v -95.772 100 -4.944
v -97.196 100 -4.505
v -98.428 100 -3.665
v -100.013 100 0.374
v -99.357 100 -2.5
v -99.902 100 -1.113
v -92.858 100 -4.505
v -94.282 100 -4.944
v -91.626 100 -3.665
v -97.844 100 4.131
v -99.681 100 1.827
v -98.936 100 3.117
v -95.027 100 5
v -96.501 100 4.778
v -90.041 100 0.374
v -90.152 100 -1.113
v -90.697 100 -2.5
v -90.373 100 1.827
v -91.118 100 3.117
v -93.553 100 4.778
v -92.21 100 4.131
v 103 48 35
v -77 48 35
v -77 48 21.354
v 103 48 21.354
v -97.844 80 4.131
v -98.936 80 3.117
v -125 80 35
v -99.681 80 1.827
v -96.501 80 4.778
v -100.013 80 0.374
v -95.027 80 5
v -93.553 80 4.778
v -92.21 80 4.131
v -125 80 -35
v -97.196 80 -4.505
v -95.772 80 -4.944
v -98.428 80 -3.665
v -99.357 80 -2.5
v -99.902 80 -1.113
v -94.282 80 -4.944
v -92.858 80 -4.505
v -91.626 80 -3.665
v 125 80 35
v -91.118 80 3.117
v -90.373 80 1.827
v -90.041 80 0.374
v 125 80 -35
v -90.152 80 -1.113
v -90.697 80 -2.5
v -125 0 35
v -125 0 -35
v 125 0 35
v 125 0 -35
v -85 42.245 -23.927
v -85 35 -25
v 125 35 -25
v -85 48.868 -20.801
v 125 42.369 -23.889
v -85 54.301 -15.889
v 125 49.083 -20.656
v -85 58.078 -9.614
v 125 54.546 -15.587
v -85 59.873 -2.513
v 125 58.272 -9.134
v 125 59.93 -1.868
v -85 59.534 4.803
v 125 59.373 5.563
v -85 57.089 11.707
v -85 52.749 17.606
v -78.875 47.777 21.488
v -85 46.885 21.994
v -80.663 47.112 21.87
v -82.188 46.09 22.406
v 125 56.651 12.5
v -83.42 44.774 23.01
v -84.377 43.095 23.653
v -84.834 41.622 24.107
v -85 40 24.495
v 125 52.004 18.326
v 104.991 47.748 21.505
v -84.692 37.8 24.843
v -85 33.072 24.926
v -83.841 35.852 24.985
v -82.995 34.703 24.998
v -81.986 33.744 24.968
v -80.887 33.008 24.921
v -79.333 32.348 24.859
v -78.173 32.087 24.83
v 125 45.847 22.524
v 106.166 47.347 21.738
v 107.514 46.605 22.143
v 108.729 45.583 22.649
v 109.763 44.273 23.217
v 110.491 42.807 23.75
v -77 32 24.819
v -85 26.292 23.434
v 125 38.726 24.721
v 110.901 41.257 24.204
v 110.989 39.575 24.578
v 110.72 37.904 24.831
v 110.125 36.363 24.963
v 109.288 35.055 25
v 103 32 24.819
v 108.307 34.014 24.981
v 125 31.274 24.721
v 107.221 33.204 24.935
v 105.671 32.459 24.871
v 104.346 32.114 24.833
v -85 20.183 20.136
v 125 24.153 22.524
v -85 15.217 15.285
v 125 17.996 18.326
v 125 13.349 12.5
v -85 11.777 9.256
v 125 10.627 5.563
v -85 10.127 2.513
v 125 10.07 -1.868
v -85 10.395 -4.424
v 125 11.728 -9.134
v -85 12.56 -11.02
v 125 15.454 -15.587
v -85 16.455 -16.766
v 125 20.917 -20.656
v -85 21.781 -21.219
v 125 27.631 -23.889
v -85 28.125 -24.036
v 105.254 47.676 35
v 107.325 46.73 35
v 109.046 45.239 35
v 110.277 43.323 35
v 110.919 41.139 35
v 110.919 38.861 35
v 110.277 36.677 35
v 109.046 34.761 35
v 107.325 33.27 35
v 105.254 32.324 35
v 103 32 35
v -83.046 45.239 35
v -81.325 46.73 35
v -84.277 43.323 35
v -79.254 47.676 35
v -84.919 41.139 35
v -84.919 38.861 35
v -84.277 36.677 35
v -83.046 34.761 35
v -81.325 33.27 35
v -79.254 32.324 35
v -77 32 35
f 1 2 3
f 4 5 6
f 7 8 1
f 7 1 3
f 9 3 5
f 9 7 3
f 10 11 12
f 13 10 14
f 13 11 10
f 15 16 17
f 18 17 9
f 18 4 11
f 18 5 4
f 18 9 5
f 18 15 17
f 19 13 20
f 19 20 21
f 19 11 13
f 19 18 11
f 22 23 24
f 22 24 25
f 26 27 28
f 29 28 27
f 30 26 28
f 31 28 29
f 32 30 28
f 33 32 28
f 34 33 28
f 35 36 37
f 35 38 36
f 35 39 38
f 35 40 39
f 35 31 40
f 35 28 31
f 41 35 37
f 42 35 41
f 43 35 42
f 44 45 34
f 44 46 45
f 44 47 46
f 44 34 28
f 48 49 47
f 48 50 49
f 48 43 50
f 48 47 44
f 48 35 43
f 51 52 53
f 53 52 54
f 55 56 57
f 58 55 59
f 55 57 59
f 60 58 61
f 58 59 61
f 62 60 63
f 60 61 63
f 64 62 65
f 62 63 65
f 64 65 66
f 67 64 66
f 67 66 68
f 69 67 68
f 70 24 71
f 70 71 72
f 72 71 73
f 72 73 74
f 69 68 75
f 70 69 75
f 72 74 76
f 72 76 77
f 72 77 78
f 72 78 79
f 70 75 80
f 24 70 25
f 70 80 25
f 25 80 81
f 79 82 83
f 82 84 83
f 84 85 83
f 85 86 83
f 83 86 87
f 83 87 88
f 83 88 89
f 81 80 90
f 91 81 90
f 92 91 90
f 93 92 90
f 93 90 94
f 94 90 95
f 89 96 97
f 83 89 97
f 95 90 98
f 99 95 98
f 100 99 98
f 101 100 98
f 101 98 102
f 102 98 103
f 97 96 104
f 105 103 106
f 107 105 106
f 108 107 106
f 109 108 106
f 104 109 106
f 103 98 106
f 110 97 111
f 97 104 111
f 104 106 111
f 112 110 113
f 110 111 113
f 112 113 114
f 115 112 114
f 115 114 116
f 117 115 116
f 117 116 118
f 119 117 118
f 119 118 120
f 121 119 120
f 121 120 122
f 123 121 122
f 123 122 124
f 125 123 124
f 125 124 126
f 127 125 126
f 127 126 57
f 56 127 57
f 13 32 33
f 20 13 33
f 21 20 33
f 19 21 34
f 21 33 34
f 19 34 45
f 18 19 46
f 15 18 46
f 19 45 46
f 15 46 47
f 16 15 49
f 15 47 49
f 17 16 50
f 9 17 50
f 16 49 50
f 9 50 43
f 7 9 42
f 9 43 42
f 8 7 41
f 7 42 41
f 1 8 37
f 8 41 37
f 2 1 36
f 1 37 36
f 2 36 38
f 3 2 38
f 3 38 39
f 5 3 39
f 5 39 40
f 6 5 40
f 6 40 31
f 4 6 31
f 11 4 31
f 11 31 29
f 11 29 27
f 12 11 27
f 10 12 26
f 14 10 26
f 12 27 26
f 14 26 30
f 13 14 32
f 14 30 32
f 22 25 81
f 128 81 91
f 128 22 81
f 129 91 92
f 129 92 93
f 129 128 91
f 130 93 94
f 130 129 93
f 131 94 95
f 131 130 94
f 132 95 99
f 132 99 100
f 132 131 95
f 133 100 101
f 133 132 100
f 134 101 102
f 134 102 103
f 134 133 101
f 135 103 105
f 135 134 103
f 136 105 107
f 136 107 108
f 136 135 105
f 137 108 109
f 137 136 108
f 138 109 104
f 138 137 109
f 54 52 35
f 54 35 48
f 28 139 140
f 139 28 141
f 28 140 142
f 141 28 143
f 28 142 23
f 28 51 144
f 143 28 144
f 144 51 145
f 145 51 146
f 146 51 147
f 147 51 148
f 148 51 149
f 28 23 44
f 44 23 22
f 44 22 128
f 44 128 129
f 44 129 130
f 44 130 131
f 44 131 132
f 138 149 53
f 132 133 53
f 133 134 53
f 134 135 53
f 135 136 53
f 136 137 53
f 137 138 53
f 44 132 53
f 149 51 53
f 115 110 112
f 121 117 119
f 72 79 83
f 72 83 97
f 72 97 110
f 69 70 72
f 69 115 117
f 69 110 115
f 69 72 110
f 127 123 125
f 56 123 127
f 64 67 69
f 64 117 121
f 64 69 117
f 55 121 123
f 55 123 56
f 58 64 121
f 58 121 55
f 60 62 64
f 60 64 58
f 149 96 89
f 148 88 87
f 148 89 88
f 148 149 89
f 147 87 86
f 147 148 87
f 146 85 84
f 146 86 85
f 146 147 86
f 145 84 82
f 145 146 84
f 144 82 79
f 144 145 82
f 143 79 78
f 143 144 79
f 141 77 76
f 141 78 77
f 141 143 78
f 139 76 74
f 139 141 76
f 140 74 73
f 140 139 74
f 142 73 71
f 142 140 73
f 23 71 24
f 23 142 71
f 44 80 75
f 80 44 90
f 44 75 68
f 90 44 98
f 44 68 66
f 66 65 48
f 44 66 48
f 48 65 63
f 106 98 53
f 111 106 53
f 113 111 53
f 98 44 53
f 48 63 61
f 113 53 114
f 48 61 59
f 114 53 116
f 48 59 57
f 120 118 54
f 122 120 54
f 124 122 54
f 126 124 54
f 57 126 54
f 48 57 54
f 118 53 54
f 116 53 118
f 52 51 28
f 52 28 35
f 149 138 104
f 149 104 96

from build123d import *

# Parameters (mm, degrees)
SKETCH1_W               = 250
SKETCH1_H               = 70
BOSS_EXTRUDE1_DEPTH     = 80
SKETCH2_R               = 25
CUT_EXTRUDE1_DEPTH      = 210
CUT_EXTRUDE2_REACH      = 166.088
CUT_EXTRUDE2_END_RADIUS = 25
SKETCH4_R               = 5
BOSS_EXTRUDE2_DEPTH     = 20


with BuildPart() as part:
    # Sketch1 → Boss-Extrude1 (new body)
    with BuildSketch(Plane(origin=(0, 0, 0), x_dir=(1, 0, 0), z_dir=(0, 1, 0))):
        Rectangle(SKETCH1_W, SKETCH1_H)
    extrude(amount=BOSS_EXTRUDE1_DEPTH)

    # Sketch2 → Cut-Extrude1 (cut)
    with BuildSketch(Plane(origin=(125, 0, 0), x_dir=(0, 0, -1), z_dir=(1, 0, 0))):
        with Locations((0, 35)):
            Circle(SKETCH2_R)
    extrude(amount=-CUT_EXTRUDE1_DEPTH, mode=Mode.SUBTRACT)

    # Cut-Extrude2: up to this cylinder (the profile starts outside it)
    cut_extrude2_end = Plane(origin=(13, 35, 0), z_dir=(1, 0, 0)) * Cylinder(CUT_EXTRUDE2_END_RADIUS, 383.176, mode=Mode.PRIVATE)
    # Sketch3 → Cut-Extrude2 (cut, up to the surface)
    with BuildSketch(Plane.XY.offset(35), mode=Mode.PRIVATE) as cut_extrude2_sk1:
        with BuildLine():
            Line((103, 32), (-77, 32))
            ThreePointArc((-77, 32), (-85, 40), (-77, 48))
            Line((-77, 48), (103, 48))
            ThreePointArc((103, 48), (111, 40), (103, 32))
        make_face()
    cut_extrude2_tool1 = extrude(cut_extrude2_sk1.sketch, amount=-CUT_EXTRUDE2_REACH, mode=Mode.PRIVATE) - cut_extrude2_end
    add(cut_extrude2_tool1.solids().sort_by_distance((13, 40, 35))[0], mode=Mode.SUBTRACT)

    # Sketch4 → Boss-Extrude2 (add)
    with BuildSketch(Plane(origin=(0, 80, 0), x_dir=(1, 0, 0), z_dir=(0, 1, 0))):
        with Locations(Location((-95.026953026, 0, 0), (0, 0, 270))):
            Circle(SKETCH4_R)
    extrude(amount=BOSS_EXTRUDE2_DEPTH)


solid = part.part
